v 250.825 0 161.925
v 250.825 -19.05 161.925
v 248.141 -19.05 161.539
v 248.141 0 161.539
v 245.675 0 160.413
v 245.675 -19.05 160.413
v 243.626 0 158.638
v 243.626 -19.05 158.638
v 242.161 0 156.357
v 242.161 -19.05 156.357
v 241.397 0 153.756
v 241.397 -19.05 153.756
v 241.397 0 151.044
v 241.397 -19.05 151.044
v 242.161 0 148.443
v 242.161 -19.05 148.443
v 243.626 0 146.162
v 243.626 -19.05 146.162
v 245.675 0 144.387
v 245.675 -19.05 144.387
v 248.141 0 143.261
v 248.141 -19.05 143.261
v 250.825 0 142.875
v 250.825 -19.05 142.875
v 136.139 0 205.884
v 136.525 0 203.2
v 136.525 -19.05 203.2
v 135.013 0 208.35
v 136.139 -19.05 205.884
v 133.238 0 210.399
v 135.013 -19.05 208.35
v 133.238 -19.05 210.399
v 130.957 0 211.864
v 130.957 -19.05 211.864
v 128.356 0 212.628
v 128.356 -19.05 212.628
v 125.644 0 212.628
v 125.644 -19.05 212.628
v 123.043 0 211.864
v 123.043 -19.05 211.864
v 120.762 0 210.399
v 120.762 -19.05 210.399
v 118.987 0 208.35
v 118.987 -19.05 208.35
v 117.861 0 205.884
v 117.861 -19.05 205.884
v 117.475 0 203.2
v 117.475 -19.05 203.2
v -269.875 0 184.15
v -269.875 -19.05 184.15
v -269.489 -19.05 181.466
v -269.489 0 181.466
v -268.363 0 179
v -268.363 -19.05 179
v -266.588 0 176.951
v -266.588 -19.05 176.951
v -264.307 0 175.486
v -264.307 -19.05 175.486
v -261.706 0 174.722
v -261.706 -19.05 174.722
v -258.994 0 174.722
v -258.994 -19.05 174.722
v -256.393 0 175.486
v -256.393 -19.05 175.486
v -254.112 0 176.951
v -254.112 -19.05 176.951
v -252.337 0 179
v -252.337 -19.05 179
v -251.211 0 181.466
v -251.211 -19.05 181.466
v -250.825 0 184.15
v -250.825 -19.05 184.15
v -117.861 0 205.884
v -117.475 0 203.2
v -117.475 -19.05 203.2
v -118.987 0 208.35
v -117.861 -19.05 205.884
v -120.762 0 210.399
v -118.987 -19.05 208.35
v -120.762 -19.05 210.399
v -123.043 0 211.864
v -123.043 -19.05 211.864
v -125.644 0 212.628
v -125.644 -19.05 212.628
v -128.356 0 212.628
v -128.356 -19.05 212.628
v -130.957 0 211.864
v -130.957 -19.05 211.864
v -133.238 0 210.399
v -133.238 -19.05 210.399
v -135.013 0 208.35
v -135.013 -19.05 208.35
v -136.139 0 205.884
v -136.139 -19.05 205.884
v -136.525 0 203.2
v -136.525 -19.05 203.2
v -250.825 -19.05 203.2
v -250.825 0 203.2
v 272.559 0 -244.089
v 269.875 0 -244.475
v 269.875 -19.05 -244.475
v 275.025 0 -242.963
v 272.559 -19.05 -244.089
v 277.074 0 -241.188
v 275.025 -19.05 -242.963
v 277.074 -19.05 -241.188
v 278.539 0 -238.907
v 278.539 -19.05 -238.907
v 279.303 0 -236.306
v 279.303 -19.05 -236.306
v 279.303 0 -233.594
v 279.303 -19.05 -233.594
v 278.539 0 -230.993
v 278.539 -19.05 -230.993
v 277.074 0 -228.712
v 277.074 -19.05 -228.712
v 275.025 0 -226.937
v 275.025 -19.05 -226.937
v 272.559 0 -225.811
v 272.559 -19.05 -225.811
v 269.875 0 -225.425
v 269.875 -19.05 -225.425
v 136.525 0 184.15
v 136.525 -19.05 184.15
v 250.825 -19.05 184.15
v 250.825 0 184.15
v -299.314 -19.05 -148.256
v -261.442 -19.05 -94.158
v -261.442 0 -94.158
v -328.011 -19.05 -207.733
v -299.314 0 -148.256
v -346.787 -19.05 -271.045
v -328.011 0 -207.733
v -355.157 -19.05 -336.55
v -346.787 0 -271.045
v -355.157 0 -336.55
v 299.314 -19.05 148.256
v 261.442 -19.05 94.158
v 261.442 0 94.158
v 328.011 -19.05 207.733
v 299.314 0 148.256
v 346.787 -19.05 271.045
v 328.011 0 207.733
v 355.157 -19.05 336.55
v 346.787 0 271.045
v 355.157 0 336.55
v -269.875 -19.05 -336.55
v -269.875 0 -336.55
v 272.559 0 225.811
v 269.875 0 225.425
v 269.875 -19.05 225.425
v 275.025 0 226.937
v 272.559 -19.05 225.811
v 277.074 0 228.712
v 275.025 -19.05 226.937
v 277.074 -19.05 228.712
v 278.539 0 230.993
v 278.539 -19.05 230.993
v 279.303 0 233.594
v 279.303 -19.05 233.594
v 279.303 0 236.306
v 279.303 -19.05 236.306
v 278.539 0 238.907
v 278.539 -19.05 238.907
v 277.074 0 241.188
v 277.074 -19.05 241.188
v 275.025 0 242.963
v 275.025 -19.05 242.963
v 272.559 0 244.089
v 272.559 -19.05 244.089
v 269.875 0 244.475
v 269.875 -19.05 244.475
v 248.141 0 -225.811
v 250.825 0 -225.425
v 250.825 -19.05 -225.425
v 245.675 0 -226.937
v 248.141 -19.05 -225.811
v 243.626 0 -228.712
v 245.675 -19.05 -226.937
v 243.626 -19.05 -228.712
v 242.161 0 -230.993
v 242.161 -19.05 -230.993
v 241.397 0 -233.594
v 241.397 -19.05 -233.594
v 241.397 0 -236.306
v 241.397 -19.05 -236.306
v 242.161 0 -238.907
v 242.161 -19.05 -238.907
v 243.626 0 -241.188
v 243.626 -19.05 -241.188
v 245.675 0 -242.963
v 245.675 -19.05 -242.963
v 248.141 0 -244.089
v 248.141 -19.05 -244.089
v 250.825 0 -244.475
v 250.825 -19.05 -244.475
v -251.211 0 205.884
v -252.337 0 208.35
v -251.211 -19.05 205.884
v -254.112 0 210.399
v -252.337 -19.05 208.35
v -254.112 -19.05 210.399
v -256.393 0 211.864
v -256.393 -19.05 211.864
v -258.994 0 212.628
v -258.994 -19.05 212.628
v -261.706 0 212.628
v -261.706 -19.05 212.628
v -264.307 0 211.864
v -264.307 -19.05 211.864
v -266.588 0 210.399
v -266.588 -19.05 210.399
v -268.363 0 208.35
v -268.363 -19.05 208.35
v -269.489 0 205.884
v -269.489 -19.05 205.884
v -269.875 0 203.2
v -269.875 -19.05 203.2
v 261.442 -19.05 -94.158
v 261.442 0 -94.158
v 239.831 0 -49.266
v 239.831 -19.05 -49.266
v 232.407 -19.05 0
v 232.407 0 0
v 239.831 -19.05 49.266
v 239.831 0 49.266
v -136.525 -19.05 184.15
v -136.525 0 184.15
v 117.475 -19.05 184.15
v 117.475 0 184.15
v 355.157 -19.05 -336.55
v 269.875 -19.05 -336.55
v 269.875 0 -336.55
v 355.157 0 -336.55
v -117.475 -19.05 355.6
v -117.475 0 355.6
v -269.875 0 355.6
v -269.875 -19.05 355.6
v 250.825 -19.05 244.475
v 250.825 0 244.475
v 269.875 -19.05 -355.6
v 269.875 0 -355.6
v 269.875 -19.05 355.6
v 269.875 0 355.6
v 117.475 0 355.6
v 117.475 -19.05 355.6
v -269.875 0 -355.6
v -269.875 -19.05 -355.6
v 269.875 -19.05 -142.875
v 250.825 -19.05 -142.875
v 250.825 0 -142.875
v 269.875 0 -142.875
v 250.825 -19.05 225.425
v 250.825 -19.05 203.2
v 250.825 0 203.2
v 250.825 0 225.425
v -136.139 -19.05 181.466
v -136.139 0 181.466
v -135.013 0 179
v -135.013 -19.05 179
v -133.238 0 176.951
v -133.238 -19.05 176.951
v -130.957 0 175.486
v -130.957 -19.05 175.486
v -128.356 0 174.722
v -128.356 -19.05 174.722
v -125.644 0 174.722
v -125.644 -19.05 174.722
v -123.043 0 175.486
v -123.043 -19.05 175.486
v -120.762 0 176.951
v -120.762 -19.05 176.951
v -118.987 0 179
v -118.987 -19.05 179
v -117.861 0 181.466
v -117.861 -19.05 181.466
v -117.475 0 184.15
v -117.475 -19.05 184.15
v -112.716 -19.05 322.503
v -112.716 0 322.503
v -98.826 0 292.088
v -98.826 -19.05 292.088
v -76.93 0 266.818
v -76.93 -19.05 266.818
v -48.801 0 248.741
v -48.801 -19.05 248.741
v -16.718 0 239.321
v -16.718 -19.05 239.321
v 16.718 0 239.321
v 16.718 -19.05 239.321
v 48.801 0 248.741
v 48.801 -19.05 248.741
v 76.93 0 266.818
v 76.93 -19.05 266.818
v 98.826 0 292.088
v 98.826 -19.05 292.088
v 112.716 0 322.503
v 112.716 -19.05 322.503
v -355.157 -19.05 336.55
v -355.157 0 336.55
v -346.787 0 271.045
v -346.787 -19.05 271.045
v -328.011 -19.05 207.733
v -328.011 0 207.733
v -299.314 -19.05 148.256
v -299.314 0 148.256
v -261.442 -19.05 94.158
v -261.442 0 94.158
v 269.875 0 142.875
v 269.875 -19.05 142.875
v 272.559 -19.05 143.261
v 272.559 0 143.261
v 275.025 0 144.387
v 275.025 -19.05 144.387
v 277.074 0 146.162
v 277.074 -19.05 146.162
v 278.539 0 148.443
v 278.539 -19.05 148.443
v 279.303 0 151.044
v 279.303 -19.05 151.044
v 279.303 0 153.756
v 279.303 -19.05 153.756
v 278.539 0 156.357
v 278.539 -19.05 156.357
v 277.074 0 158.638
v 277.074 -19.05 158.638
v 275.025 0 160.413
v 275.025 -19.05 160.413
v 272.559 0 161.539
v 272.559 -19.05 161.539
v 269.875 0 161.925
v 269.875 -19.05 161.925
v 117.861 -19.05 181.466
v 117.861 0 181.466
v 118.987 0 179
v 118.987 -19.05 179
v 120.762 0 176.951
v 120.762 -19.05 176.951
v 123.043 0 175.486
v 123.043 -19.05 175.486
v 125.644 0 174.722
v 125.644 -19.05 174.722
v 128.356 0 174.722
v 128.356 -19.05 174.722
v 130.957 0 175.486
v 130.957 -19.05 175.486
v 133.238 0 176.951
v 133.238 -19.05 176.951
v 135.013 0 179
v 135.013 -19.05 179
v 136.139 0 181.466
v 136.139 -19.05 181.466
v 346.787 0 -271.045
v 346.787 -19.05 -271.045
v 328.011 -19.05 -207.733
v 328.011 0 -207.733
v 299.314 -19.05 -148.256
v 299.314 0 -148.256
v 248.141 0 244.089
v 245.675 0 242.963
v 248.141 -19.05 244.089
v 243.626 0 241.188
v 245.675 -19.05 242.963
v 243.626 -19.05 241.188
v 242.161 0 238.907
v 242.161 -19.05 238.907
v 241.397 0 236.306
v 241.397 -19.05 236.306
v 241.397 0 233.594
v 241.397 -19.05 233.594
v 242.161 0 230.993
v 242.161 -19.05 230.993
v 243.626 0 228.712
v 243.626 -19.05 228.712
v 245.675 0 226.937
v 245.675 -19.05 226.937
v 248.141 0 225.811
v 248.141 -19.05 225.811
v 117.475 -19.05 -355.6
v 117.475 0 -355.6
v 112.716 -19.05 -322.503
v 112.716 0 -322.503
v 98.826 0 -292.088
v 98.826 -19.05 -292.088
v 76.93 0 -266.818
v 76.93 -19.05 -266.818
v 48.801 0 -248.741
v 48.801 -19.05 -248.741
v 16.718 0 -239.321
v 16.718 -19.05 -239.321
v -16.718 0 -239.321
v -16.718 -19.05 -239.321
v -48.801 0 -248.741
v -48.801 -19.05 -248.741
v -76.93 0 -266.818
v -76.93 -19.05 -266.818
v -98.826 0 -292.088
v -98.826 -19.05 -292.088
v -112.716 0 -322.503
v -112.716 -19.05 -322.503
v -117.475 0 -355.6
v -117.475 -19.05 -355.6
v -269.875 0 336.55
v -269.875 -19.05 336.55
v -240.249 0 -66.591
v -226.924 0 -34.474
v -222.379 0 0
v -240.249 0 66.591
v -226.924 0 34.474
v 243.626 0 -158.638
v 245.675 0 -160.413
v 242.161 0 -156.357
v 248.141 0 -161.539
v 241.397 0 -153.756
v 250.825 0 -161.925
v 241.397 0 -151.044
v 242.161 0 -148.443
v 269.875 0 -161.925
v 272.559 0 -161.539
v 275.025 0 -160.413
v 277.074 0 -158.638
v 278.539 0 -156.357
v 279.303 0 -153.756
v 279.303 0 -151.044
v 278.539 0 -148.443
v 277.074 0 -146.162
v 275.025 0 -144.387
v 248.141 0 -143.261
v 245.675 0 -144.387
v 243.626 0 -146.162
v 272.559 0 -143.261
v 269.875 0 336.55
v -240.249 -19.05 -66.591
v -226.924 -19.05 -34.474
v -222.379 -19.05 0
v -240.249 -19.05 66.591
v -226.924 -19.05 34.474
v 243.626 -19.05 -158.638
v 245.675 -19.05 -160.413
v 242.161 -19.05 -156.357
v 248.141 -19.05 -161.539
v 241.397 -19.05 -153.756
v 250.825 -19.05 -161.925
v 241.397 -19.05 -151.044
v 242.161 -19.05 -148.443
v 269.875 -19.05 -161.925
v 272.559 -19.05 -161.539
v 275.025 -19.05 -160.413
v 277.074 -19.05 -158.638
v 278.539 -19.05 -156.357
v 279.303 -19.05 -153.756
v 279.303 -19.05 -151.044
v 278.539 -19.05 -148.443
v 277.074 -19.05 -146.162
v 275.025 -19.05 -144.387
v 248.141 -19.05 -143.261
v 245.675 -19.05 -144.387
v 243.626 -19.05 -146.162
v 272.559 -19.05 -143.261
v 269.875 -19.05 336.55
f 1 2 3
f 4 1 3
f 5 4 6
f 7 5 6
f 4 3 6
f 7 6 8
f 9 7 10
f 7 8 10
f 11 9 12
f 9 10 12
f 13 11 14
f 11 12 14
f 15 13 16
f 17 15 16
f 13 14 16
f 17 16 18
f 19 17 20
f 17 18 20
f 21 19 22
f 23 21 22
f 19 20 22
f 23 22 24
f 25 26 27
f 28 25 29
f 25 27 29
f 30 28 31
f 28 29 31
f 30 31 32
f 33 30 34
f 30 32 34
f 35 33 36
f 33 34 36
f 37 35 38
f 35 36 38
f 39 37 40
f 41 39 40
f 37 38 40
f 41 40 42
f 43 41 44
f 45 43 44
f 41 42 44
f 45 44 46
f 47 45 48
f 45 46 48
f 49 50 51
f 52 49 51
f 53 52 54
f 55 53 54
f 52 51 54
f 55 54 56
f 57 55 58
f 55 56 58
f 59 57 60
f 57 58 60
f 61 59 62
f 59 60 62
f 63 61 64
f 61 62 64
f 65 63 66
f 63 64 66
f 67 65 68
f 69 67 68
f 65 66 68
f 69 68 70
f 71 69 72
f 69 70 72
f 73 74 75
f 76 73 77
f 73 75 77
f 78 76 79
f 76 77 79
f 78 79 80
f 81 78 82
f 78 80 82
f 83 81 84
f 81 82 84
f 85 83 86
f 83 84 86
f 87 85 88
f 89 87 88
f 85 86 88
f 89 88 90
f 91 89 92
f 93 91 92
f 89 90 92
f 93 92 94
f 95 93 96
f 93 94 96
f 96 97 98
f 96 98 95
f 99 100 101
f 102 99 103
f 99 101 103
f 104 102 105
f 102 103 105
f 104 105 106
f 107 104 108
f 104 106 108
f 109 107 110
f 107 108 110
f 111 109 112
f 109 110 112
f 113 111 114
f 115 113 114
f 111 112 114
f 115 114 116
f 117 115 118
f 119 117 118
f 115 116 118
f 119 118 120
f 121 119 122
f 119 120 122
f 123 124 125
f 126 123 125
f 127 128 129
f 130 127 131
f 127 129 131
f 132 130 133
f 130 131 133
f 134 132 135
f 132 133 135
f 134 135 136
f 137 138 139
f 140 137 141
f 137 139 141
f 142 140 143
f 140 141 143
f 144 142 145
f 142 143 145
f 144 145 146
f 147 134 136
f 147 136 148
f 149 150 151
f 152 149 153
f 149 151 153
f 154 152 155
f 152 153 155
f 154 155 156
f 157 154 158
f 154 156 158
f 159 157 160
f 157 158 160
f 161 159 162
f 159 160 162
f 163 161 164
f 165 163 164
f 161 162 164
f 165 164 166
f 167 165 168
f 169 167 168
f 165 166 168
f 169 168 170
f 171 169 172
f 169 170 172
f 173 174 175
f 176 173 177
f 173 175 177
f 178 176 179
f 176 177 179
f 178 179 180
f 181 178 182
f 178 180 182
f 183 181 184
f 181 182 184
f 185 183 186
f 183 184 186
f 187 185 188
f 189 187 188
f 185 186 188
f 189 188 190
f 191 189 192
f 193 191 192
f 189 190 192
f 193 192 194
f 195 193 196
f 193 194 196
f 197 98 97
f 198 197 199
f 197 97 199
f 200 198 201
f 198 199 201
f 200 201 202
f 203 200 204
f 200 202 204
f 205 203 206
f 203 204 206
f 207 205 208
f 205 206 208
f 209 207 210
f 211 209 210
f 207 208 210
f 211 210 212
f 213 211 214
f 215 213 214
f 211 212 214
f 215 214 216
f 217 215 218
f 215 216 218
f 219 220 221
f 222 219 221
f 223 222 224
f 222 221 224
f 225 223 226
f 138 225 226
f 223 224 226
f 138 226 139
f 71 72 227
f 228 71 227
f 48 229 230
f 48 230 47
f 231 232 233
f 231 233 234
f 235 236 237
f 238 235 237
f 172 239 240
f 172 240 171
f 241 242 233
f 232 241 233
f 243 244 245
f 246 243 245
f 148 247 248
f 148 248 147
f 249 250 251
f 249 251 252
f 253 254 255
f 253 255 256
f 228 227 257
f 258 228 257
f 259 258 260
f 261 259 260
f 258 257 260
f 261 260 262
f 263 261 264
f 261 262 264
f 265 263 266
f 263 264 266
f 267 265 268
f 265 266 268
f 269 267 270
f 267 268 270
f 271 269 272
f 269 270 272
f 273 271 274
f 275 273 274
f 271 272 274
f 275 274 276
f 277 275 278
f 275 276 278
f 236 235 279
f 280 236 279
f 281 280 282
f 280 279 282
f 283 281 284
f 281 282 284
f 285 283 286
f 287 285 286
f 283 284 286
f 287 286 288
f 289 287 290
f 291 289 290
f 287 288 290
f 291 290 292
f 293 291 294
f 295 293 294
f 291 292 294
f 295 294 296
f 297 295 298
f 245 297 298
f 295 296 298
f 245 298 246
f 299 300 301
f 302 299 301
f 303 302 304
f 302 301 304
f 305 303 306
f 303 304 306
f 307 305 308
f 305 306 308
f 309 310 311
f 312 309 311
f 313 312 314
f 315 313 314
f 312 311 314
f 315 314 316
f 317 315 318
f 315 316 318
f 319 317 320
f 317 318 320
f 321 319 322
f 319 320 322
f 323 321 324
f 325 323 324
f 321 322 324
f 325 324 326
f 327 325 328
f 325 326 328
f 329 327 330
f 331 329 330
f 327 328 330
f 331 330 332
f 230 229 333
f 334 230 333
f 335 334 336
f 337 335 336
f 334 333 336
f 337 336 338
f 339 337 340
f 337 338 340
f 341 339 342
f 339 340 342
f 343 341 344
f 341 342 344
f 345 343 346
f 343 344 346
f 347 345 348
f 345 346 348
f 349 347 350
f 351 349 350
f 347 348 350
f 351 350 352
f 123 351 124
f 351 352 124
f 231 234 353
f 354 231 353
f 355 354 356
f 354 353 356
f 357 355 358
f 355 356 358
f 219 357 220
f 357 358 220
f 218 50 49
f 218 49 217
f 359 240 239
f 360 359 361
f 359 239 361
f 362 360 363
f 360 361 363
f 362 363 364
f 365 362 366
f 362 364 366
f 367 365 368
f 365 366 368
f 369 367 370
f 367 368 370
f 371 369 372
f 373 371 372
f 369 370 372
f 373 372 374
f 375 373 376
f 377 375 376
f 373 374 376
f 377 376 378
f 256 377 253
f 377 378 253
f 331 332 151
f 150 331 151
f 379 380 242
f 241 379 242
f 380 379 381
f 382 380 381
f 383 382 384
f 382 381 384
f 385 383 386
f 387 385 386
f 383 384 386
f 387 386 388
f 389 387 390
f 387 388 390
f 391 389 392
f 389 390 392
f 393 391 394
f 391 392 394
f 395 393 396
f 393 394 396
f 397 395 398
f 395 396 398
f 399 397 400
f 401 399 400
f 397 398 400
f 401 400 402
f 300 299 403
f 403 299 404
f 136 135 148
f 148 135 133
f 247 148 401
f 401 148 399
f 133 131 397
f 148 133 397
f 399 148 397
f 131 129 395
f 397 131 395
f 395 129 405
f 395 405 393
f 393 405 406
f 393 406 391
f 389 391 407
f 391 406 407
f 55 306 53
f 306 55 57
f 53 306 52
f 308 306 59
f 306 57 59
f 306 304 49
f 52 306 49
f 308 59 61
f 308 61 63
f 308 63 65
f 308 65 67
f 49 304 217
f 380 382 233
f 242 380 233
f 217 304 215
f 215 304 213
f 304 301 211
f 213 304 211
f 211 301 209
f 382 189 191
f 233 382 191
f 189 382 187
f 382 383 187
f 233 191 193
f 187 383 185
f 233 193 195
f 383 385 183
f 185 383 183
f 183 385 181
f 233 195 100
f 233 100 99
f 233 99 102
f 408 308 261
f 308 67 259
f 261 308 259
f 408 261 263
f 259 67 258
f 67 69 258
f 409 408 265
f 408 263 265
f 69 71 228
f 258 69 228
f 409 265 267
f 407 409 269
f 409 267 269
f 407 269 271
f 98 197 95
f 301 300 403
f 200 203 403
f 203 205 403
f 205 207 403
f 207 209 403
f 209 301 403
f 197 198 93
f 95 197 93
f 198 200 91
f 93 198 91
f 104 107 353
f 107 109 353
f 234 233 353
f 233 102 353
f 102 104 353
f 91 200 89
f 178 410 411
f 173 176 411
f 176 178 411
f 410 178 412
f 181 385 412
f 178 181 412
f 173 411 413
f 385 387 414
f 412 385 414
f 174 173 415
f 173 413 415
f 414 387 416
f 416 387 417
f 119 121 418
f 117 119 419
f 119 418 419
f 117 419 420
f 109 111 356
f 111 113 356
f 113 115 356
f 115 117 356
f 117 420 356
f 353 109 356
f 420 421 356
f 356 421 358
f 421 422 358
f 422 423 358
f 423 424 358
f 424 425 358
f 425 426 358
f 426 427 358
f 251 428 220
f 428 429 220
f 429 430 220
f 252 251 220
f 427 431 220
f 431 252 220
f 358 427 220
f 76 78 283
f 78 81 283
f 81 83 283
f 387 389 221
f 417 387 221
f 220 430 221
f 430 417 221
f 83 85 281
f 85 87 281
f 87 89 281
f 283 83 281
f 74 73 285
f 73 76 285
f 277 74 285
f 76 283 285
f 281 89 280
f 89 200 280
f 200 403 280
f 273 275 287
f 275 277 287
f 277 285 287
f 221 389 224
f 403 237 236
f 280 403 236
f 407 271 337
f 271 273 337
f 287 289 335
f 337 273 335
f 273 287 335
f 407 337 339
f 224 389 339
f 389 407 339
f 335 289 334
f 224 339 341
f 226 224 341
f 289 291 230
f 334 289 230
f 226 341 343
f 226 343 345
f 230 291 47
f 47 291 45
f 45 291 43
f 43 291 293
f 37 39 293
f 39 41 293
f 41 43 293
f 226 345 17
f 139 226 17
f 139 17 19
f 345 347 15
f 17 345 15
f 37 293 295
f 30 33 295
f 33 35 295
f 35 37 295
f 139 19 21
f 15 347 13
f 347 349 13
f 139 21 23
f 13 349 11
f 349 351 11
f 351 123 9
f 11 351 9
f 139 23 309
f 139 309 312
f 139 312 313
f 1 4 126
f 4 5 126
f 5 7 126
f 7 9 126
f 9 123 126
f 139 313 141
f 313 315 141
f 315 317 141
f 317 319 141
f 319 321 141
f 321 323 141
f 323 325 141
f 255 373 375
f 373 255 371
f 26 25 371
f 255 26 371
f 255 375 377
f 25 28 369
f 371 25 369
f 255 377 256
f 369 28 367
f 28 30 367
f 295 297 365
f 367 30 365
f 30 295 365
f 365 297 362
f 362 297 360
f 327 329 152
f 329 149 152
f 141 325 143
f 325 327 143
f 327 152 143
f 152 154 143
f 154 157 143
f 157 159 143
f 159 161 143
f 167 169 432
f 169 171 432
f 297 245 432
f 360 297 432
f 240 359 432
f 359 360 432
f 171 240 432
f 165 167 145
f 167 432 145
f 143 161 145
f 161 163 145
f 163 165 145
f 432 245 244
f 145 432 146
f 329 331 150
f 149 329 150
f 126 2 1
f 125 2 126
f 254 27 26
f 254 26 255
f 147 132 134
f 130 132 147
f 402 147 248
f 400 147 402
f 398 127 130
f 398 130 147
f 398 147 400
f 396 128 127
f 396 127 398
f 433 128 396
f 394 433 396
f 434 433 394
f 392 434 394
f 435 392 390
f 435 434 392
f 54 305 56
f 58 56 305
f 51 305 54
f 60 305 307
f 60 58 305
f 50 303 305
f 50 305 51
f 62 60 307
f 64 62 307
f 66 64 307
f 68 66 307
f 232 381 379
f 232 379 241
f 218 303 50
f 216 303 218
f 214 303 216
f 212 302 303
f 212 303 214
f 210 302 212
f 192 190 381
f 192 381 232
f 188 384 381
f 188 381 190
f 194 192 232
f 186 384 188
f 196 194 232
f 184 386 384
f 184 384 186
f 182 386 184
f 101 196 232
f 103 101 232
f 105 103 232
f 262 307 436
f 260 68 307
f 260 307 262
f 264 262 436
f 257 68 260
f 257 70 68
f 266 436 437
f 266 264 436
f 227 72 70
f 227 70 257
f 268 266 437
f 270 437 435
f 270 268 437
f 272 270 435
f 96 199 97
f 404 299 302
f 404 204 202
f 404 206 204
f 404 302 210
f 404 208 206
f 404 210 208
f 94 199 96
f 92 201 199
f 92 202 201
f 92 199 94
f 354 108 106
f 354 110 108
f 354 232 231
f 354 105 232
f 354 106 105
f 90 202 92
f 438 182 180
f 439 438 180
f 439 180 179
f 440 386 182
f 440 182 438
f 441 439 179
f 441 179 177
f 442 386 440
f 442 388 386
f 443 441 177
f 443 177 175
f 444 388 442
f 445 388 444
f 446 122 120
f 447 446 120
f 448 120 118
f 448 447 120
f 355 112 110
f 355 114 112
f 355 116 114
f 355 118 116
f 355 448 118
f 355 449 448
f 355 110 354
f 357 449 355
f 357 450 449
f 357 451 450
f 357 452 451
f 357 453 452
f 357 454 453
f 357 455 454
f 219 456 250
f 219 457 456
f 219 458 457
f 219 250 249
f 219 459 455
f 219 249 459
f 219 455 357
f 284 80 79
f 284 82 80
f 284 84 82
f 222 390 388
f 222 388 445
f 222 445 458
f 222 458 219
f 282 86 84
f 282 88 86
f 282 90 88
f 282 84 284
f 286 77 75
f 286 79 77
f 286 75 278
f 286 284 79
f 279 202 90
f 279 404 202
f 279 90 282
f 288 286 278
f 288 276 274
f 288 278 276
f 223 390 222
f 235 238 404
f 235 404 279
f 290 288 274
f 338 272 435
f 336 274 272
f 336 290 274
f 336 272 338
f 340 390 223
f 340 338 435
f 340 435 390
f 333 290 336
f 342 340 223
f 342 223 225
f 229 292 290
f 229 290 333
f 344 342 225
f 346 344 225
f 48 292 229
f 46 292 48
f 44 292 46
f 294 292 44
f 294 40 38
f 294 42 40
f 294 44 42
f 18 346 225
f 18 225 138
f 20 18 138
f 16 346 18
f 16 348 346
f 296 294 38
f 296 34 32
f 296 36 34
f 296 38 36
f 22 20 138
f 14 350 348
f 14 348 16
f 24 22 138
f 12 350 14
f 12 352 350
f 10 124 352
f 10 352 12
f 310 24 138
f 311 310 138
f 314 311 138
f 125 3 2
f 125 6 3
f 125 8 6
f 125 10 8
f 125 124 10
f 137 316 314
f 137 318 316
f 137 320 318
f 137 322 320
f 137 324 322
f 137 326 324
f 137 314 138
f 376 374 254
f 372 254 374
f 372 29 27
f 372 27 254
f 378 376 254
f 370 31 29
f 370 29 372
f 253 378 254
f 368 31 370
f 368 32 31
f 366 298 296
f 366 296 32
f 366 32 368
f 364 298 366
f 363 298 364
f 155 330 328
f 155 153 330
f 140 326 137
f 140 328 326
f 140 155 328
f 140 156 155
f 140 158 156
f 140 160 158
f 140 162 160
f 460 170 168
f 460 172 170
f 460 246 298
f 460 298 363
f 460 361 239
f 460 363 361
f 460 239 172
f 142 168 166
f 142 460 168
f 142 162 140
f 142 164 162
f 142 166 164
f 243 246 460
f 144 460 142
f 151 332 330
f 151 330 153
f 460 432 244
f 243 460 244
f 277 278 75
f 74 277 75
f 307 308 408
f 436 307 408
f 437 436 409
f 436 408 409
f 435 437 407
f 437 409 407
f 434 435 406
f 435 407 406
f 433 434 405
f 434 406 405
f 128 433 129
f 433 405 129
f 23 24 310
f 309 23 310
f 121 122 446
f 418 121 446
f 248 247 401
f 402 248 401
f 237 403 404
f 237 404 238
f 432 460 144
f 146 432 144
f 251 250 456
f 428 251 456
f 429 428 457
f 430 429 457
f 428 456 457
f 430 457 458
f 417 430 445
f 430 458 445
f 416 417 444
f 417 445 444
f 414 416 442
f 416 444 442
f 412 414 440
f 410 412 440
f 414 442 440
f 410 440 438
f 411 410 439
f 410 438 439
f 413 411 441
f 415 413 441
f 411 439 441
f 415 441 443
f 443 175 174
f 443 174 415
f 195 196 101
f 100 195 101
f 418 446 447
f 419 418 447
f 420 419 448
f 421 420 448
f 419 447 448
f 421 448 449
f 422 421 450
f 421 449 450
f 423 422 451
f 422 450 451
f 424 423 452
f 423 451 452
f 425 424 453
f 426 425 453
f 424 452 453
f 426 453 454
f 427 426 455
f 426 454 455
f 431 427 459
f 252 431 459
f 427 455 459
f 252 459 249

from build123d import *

# Parameters (mm, degrees)
F2_DEPTH  = 19.05
F3_W      = 85.725
F3_H      = 19.05
F3_R      = 117.475
F4_DEPTH  = 25.4
F5_W      = 152.4
F5_H      = 19.05
F6_DEPTH  = 25.4
F8_DEPTH  = 25.4
F9_W      = 19.05
F9_H      = 101.6
F10_DEPTH = 25.4
F12_DEPTH = 25.4


# Not quite as in the source:
# - a variable given as a bare number and used for a length is read in inches; the dataset says mm whatever the document's units were


with BuildPart() as f2:
    # F1 (on Front) → F2 (new body)
    with BuildSketch(Plane.XZ):
        with BuildLine():
            Line((355.6, 355.6), (203.2, 355.6))
            Line((203.2, 355.6), (-203.2, 355.6))
            Line((-203.2, 355.6), (-355.6, 355.6))
            ThreePointArc((-355.6, 355.6), (-331.3431214209, 216.6595631931), (-261.4423933195, 94.1576066805))
            ThreePointArc((-261.4423933195, 94.1576066805), (-222.3790342141, 0), (-261.4423933195, -94.1576066805))
            ThreePointArc((-261.4423933195, -94.1576066805), (-331.3431214209, -216.6595631931), (-355.6, -355.6))
            Line((-355.6, -355.6), (-203.2, -355.6))
            Line((-203.2, -355.6), (203.2, -355.6))
            Line((203.2, -355.6), (355.6, -355.6))
            ThreePointArc((355.6, -355.6), (331.3431214209, -216.6595631931), (261.4423933195, -94.1576066805))
            ThreePointArc((261.4423933195, -94.1576066805), (232.4074653208, 0), (261.4423933195, 94.1576066805))
            ThreePointArc((261.4423933195, 94.1576066805), (331.3431214209, 216.6595631931), (355.6, 355.6))
        make_face()
    extrude(amount=F2_DEPTH)

    # F3 (on face) → F4 (cut)
    with BuildSketch(Plane.XZ.offset(19.05)):
        with Locations((-312.7375, 346.075)):
            Rectangle(F3_W, F3_H)
        with Locations((312.7375, 346.075)):
            Rectangle(F3_W, F3_H)
        with Locations((312.7375, -346.075)):
            Rectangle(F3_W, F3_H)
        with Locations((-312.7375, -346.075)):
            Rectangle(F3_W, F3_H)
        with Locations((0, 355.6)):
            Circle(F3_R)
        with Locations((0, -355.6)):
            Circle(F3_R)
    extrude(amount=-F4_DEPTH, mode=Mode.SUBTRACT)

    # F5 (on face) → F6 (cut)
    with BuildSketch(Plane.XZ.offset(19.05)):
        with Locations((-193.675, 193.675)):
            Rectangle(F5_W, F5_H)
        with Locations((193.675, 193.675)):
            Rectangle(F5_W, F5_H)
    extrude(amount=-F6_DEPTH, mode=Mode.SUBTRACT)

    # F7 (on face) → F8 (cut)
    with BuildSketch(Plane.XZ.offset(19.05)):
        with BuildLine():
            Line((-250.825, 184.15), (-250.825, 203.2))
            ThreePointArc((-250.825, 203.2), (-260.35, 212.725), (-269.875, 203.2))
            Line((-269.875, 203.2), (-269.875, 184.15))
            ThreePointArc((-269.875, 184.15), (-260.35, 174.625), (-250.825, 184.15))
        make_face()
        with BuildLine():
            ThreePointArc((-117.475, 203.2), (-127, 212.725), (-136.525, 203.2))
            Line((-136.525, 203.2), (-136.525, 184.15))
            ThreePointArc((-136.525, 184.15), (-127, 174.625), (-117.475, 184.15))
            Line((-117.475, 184.15), (-117.475, 203.2))
        make_face()
        with BuildLine():
            Line((117.475, 203.2), (117.475, 184.15))
            ThreePointArc((117.475, 184.15), (127, 174.625), (136.525, 184.15))
            Line((136.525, 184.15), (136.525, 203.2))
            ThreePointArc((136.525, 203.2), (127, 212.725), (117.475, 203.2))
        make_face()
        with BuildLine():
            ThreePointArc((269.875, 203.2), (260.35, 212.725), (250.825, 203.2))
            Line((250.825, 203.2), (250.825, 184.15))
            ThreePointArc((250.825, 184.15), (260.35, 174.625), (269.875, 184.15))
            Line((269.875, 184.15), (269.875, 203.2))
        make_face()
    extrude(amount=-F8_DEPTH, mode=Mode.SUBTRACT)

    # F9 (on face) → F10 (cut)
    with BuildSketch(Plane.XZ.offset(19.05)):
        with Locations((260.35, 193.675)):
            Rectangle(F9_W, F9_H)
        with Locations((260.35, -193.675)):
            Rectangle(F9_W, F9_H)
    extrude(amount=-F10_DEPTH, mode=Mode.SUBTRACT)

    # F11 (on face) → F12 (cut)
    with BuildSketch(Plane.XZ.offset(19.05)):
        with BuildLine():
            Line((269.875, 244.475), (250.825, 244.475))
            ThreePointArc((250.825, 244.475), (241.3, 234.95), (250.825, 225.425))
            Line((250.825, 225.425), (269.875, 225.425))
            ThreePointArc((269.875, 225.425), (279.4, 234.95), (269.875, 244.475))
        make_face()
        with BuildLine():
            ThreePointArc((269.875, 142.875), (279.4, 152.4), (269.875, 161.925))
            Line((269.875, 161.925), (250.825, 161.925))
            ThreePointArc((250.825, 161.925), (241.3, 152.4), (250.825, 142.875))
            Line((250.825, 142.875), (269.875, 142.875))
        make_face()
        with BuildLine():
            Line((269.875, -142.875), (250.825, -142.875))
            ThreePointArc((250.825, -142.875), (241.3, -152.4), (250.825, -161.925))
            Line((250.825, -161.925), (269.875, -161.925))
            ThreePointArc((269.875, -161.925), (279.4, -152.4), (269.875, -142.875))
        make_face()
        with BuildLine():
            ThreePointArc((250.825, -225.425), (241.3, -234.95), (250.825, -244.475))
            Line((250.825, -244.475), (269.875, -244.475))
            ThreePointArc((269.875, -244.475), (279.4, -234.95), (269.875, -225.425))
            Line((269.875, -225.425), (250.825, -225.425))
        make_face()
    extrude(amount=-F12_DEPTH, mode=Mode.SUBTRACT)


solid = f2.part
